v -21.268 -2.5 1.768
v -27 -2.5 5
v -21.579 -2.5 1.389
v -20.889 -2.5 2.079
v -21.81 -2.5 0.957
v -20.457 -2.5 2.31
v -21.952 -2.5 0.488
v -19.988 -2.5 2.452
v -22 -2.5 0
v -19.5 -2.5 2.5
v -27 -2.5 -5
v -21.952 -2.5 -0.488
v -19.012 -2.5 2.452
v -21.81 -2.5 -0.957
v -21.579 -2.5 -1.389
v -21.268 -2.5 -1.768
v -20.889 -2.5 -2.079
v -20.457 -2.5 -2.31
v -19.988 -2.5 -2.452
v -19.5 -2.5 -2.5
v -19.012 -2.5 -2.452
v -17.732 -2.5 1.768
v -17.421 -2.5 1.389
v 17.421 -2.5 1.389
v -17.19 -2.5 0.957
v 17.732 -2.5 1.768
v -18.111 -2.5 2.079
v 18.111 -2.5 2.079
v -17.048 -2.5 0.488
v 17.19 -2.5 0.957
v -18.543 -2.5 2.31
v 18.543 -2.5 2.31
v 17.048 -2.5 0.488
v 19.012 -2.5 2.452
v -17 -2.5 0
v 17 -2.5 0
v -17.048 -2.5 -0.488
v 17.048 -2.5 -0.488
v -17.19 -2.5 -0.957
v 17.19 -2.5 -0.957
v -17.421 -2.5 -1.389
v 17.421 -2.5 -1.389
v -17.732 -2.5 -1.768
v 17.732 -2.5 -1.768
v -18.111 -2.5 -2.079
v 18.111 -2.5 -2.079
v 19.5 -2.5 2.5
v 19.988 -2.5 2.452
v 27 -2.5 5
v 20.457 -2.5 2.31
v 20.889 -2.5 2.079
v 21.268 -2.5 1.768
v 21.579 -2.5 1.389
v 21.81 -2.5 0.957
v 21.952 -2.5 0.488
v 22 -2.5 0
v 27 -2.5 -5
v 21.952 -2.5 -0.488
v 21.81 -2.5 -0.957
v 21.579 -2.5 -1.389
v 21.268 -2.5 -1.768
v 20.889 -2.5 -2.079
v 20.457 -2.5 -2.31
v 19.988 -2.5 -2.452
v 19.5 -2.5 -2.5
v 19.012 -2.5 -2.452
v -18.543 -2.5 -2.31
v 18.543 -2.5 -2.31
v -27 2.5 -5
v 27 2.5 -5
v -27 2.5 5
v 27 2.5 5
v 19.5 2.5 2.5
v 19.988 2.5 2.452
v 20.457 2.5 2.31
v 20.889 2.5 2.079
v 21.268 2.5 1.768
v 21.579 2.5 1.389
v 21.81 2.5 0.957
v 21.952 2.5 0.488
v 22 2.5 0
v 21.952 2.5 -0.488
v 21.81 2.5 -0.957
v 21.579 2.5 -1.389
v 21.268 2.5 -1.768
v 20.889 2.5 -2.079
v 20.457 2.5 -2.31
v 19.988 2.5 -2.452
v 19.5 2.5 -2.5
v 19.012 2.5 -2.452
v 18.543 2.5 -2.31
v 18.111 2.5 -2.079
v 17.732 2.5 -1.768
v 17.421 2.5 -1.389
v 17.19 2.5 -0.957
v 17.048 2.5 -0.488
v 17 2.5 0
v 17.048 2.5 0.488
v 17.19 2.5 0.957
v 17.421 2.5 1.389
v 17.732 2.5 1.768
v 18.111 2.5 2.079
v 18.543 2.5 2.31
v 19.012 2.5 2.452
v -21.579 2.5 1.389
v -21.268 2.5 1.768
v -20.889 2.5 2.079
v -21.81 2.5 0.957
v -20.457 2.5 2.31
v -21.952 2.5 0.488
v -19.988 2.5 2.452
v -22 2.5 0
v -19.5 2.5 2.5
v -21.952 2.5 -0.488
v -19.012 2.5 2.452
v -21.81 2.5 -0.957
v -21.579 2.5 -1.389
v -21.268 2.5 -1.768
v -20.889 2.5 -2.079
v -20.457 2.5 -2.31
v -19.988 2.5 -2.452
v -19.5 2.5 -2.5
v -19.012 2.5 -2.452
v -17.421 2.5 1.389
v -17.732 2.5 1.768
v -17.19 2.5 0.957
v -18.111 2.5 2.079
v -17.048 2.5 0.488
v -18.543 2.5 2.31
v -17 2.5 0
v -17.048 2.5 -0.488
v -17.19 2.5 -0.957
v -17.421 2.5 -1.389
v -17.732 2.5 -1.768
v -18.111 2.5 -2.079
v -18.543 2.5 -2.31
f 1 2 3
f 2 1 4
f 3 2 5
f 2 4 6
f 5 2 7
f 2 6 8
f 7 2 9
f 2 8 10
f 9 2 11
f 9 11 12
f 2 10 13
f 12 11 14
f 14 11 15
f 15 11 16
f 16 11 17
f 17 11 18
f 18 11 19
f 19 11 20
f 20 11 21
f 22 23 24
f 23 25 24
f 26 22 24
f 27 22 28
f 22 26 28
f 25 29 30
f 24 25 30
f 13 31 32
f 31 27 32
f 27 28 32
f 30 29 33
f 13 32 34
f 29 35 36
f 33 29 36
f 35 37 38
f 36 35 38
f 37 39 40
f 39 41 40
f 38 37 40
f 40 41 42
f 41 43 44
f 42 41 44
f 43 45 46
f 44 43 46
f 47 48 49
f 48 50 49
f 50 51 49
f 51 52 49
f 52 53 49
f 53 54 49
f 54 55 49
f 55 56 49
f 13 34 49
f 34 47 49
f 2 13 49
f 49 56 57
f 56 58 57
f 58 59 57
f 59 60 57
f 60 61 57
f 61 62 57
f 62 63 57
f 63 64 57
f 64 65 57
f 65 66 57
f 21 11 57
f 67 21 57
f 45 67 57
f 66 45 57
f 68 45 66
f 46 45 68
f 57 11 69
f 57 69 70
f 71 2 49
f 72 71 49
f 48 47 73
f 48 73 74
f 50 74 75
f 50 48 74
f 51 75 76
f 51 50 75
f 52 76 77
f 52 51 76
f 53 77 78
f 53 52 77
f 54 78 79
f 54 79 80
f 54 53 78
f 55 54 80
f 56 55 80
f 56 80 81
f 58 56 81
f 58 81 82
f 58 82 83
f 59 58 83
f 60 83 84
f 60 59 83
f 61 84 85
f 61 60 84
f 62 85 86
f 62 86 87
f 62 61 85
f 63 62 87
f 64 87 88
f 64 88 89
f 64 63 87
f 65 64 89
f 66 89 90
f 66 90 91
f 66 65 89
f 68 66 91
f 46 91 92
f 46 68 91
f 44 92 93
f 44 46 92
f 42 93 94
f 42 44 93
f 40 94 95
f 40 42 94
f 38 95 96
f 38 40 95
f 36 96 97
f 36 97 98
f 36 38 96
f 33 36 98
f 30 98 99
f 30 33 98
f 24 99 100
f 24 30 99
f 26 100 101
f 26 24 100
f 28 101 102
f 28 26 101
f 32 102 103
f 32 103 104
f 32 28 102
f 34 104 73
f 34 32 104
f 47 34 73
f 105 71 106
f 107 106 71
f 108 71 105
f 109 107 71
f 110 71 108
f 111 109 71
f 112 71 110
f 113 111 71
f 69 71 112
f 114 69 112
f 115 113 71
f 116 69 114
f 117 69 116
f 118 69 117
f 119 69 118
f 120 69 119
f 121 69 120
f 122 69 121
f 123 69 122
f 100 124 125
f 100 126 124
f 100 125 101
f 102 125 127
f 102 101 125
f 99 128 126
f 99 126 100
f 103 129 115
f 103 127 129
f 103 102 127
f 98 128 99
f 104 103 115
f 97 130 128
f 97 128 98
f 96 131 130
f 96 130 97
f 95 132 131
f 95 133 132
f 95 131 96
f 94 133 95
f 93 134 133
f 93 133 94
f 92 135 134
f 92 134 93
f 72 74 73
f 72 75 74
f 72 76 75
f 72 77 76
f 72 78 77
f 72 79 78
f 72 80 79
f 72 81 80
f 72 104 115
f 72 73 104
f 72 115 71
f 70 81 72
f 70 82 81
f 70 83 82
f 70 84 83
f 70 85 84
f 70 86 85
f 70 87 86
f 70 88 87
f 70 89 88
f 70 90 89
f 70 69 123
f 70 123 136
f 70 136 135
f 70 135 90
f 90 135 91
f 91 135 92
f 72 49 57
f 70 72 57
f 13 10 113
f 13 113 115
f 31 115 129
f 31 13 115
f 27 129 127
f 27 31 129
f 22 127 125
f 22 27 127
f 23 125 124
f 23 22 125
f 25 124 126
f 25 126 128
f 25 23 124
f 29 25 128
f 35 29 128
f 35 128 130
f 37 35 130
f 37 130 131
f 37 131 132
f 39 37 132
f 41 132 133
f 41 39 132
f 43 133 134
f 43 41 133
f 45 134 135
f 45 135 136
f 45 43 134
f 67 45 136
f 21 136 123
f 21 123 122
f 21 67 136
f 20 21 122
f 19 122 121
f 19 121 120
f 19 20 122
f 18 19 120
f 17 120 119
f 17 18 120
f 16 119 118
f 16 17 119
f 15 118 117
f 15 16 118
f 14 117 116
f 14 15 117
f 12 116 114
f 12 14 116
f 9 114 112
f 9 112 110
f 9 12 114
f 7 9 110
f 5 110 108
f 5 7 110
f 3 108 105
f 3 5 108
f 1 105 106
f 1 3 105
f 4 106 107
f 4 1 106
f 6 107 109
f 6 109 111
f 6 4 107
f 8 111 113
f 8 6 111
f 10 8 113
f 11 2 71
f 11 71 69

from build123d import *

# Parameters (mm, degrees)
BOSS_EXTRUDE1_DEPTH      = 2.5
BOSS_EXTRUDE1_DEPTH_BACK = 2.5
SKETCH1_W                = 54
SKETCH1_H                = 10
SKETCH1_R                = 2.5


with BuildPart() as part:
    # Sketch1 → Boss-Extrude1 (new, two sides: drawn at the far end of the back side and taken through both)
    with BuildSketch(Plane(origin=(0, 0, 0), x_dir=(1, 0, 0), z_dir=(0, 1, 0)).offset(-BOSS_EXTRUDE1_DEPTH_BACK)):
        Rectangle(SKETCH1_W, SKETCH1_H)
        with Locations((-19.5, 0)):
            Circle(SKETCH1_R, mode=Mode.SUBTRACT)
        with Locations((19.5, 0)):
            Circle(SKETCH1_R, mode=Mode.SUBTRACT)
    extrude(amount=BOSS_EXTRUDE1_DEPTH + BOSS_EXTRUDE1_DEPTH_BACK)


solid = part.part
